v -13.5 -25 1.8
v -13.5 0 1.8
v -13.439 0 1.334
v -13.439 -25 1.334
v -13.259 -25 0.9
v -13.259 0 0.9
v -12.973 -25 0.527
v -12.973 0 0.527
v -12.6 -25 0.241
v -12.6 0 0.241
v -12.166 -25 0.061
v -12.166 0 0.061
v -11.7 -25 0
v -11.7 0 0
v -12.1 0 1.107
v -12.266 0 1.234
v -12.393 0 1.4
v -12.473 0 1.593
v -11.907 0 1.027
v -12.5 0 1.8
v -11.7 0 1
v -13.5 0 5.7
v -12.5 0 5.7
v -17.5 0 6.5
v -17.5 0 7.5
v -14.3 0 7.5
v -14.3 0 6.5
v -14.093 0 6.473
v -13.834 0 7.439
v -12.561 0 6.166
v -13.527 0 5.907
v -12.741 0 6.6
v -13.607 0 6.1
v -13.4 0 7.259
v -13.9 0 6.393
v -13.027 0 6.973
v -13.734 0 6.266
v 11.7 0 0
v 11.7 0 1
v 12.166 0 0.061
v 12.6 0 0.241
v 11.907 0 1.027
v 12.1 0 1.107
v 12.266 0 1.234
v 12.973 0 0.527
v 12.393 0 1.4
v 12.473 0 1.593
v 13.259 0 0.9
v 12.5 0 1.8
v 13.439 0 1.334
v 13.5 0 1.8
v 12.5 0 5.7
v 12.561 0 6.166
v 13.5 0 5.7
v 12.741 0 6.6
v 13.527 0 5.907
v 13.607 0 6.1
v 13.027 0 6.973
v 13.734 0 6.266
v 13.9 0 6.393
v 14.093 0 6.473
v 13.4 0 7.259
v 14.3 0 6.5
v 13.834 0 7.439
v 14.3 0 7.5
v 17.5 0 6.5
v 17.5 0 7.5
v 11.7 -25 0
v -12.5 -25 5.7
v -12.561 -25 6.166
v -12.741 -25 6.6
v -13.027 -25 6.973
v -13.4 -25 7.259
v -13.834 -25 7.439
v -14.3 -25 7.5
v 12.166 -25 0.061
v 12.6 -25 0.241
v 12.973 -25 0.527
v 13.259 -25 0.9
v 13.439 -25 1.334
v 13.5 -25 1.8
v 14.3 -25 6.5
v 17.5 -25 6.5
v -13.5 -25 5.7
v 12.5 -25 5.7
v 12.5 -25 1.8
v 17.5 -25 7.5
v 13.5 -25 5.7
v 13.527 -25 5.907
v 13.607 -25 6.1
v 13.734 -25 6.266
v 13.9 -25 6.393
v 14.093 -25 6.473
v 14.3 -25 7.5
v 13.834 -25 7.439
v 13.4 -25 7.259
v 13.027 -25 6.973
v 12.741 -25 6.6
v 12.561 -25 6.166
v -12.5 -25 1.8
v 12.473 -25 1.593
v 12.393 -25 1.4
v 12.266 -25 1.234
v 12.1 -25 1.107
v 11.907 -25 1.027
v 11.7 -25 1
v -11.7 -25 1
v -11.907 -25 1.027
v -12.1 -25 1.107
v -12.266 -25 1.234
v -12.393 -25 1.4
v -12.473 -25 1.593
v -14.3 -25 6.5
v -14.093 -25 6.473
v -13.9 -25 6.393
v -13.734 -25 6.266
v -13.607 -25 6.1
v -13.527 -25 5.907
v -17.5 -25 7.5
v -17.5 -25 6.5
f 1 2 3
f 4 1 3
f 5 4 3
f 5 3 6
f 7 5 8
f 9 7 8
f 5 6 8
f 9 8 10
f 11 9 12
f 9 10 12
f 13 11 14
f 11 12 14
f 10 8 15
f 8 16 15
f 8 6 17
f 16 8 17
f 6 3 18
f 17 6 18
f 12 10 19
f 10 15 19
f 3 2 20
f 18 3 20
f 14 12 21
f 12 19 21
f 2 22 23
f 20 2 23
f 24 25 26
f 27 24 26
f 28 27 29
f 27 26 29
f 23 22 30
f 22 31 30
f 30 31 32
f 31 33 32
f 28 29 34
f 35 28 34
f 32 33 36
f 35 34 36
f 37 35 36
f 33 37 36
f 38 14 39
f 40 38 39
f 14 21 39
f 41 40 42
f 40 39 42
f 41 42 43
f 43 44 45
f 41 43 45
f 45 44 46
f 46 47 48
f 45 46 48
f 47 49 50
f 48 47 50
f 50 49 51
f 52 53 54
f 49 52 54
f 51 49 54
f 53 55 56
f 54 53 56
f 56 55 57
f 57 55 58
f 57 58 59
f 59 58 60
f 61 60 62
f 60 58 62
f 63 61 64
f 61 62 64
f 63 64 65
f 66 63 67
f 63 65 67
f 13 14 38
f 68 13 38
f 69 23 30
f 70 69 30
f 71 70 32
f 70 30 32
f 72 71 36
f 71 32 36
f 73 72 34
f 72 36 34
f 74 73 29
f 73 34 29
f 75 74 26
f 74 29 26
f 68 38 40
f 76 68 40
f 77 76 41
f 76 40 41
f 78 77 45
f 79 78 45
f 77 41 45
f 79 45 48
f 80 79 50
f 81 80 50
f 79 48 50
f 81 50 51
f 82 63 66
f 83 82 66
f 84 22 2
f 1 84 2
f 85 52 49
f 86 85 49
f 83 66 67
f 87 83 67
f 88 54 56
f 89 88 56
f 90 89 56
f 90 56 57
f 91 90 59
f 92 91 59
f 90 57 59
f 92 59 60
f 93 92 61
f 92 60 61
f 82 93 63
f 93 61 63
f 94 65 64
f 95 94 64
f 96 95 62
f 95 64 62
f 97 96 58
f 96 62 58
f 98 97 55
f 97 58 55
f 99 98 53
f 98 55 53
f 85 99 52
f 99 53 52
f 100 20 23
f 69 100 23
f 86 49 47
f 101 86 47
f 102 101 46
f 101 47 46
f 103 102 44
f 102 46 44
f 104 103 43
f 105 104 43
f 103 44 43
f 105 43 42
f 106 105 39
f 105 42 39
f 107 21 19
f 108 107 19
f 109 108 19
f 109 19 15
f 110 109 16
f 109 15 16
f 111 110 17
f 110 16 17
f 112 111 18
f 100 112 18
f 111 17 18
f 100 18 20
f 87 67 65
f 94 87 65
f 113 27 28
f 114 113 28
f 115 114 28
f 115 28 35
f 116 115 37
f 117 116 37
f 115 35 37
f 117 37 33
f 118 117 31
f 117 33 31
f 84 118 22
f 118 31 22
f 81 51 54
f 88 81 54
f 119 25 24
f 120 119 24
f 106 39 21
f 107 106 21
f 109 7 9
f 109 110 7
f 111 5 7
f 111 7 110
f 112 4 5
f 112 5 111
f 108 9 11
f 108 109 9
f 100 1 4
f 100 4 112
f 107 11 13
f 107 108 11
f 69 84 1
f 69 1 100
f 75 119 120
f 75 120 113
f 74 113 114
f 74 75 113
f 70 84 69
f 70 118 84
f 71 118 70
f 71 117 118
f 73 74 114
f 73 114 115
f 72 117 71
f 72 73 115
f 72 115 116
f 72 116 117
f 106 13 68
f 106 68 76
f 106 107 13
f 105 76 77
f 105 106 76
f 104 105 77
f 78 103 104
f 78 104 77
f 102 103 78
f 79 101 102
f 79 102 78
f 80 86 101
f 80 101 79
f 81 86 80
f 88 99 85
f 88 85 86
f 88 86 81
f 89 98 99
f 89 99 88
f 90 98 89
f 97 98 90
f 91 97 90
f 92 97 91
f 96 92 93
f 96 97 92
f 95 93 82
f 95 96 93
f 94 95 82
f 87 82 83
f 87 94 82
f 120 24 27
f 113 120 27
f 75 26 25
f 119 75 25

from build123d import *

# Parameters (mm, degrees)
F1_DEPTH = 25


with BuildPart() as f1:
    # F0 (on Front) → F1 (new body)
    with BuildSketch(Plane.XZ):
        with BuildLine():
            Line((-11.7, 0), (0, 0))
            Line((0, 0), (11.7, 0))
            ThreePointArc((11.7, 0), (12.972792, 0.527208), (13.5, 1.8))
            Line((13.5, 1.8), (13.5, 5.7))
            ThreePointArc((13.5, 5.7), (13.734315, 6.265685), (14.3, 6.5))
            Line((14.3, 6.5), (17.5, 6.5))
            Line((17.5, 6.5), (17.5, 7.5))
            Line((17.5, 7.5), (14.3, 7.5))
            ThreePointArc((14.3, 7.5), (13.027208, 6.972792), (12.5, 5.7))
            Line((12.5, 5.7), (12.5, 1.8))
            ThreePointArc((12.5, 1.8), (12.265685, 1.234315), (11.7, 1))
            Line((11.7, 1), (0, 1))
            Line((0, 1), (-11.7, 1))
            ThreePointArc((-11.7, 1), (-12.265685, 1.234315), (-12.5, 1.8))
            Line((-12.5, 1.8), (-12.5, 5.7))
            ThreePointArc((-12.5, 5.7), (-13.027208, 6.972792), (-14.3, 7.5))
            Line((-14.3, 7.5), (-17.5, 7.5))
            Line((-17.5, 7.5), (-17.5, 6.5))
            Line((-17.5, 6.5), (-14.3, 6.5))
            ThreePointArc((-14.3, 6.5), (-13.734315, 6.265685), (-13.5, 5.7))
            Line((-13.5, 5.7), (-13.5, 1.8))
            ThreePointArc((-13.5, 1.8), (-12.972792, 0.527208), (-11.7, 0))
        make_face()
    extrude(amount=F1_DEPTH)


solid = f1.part
